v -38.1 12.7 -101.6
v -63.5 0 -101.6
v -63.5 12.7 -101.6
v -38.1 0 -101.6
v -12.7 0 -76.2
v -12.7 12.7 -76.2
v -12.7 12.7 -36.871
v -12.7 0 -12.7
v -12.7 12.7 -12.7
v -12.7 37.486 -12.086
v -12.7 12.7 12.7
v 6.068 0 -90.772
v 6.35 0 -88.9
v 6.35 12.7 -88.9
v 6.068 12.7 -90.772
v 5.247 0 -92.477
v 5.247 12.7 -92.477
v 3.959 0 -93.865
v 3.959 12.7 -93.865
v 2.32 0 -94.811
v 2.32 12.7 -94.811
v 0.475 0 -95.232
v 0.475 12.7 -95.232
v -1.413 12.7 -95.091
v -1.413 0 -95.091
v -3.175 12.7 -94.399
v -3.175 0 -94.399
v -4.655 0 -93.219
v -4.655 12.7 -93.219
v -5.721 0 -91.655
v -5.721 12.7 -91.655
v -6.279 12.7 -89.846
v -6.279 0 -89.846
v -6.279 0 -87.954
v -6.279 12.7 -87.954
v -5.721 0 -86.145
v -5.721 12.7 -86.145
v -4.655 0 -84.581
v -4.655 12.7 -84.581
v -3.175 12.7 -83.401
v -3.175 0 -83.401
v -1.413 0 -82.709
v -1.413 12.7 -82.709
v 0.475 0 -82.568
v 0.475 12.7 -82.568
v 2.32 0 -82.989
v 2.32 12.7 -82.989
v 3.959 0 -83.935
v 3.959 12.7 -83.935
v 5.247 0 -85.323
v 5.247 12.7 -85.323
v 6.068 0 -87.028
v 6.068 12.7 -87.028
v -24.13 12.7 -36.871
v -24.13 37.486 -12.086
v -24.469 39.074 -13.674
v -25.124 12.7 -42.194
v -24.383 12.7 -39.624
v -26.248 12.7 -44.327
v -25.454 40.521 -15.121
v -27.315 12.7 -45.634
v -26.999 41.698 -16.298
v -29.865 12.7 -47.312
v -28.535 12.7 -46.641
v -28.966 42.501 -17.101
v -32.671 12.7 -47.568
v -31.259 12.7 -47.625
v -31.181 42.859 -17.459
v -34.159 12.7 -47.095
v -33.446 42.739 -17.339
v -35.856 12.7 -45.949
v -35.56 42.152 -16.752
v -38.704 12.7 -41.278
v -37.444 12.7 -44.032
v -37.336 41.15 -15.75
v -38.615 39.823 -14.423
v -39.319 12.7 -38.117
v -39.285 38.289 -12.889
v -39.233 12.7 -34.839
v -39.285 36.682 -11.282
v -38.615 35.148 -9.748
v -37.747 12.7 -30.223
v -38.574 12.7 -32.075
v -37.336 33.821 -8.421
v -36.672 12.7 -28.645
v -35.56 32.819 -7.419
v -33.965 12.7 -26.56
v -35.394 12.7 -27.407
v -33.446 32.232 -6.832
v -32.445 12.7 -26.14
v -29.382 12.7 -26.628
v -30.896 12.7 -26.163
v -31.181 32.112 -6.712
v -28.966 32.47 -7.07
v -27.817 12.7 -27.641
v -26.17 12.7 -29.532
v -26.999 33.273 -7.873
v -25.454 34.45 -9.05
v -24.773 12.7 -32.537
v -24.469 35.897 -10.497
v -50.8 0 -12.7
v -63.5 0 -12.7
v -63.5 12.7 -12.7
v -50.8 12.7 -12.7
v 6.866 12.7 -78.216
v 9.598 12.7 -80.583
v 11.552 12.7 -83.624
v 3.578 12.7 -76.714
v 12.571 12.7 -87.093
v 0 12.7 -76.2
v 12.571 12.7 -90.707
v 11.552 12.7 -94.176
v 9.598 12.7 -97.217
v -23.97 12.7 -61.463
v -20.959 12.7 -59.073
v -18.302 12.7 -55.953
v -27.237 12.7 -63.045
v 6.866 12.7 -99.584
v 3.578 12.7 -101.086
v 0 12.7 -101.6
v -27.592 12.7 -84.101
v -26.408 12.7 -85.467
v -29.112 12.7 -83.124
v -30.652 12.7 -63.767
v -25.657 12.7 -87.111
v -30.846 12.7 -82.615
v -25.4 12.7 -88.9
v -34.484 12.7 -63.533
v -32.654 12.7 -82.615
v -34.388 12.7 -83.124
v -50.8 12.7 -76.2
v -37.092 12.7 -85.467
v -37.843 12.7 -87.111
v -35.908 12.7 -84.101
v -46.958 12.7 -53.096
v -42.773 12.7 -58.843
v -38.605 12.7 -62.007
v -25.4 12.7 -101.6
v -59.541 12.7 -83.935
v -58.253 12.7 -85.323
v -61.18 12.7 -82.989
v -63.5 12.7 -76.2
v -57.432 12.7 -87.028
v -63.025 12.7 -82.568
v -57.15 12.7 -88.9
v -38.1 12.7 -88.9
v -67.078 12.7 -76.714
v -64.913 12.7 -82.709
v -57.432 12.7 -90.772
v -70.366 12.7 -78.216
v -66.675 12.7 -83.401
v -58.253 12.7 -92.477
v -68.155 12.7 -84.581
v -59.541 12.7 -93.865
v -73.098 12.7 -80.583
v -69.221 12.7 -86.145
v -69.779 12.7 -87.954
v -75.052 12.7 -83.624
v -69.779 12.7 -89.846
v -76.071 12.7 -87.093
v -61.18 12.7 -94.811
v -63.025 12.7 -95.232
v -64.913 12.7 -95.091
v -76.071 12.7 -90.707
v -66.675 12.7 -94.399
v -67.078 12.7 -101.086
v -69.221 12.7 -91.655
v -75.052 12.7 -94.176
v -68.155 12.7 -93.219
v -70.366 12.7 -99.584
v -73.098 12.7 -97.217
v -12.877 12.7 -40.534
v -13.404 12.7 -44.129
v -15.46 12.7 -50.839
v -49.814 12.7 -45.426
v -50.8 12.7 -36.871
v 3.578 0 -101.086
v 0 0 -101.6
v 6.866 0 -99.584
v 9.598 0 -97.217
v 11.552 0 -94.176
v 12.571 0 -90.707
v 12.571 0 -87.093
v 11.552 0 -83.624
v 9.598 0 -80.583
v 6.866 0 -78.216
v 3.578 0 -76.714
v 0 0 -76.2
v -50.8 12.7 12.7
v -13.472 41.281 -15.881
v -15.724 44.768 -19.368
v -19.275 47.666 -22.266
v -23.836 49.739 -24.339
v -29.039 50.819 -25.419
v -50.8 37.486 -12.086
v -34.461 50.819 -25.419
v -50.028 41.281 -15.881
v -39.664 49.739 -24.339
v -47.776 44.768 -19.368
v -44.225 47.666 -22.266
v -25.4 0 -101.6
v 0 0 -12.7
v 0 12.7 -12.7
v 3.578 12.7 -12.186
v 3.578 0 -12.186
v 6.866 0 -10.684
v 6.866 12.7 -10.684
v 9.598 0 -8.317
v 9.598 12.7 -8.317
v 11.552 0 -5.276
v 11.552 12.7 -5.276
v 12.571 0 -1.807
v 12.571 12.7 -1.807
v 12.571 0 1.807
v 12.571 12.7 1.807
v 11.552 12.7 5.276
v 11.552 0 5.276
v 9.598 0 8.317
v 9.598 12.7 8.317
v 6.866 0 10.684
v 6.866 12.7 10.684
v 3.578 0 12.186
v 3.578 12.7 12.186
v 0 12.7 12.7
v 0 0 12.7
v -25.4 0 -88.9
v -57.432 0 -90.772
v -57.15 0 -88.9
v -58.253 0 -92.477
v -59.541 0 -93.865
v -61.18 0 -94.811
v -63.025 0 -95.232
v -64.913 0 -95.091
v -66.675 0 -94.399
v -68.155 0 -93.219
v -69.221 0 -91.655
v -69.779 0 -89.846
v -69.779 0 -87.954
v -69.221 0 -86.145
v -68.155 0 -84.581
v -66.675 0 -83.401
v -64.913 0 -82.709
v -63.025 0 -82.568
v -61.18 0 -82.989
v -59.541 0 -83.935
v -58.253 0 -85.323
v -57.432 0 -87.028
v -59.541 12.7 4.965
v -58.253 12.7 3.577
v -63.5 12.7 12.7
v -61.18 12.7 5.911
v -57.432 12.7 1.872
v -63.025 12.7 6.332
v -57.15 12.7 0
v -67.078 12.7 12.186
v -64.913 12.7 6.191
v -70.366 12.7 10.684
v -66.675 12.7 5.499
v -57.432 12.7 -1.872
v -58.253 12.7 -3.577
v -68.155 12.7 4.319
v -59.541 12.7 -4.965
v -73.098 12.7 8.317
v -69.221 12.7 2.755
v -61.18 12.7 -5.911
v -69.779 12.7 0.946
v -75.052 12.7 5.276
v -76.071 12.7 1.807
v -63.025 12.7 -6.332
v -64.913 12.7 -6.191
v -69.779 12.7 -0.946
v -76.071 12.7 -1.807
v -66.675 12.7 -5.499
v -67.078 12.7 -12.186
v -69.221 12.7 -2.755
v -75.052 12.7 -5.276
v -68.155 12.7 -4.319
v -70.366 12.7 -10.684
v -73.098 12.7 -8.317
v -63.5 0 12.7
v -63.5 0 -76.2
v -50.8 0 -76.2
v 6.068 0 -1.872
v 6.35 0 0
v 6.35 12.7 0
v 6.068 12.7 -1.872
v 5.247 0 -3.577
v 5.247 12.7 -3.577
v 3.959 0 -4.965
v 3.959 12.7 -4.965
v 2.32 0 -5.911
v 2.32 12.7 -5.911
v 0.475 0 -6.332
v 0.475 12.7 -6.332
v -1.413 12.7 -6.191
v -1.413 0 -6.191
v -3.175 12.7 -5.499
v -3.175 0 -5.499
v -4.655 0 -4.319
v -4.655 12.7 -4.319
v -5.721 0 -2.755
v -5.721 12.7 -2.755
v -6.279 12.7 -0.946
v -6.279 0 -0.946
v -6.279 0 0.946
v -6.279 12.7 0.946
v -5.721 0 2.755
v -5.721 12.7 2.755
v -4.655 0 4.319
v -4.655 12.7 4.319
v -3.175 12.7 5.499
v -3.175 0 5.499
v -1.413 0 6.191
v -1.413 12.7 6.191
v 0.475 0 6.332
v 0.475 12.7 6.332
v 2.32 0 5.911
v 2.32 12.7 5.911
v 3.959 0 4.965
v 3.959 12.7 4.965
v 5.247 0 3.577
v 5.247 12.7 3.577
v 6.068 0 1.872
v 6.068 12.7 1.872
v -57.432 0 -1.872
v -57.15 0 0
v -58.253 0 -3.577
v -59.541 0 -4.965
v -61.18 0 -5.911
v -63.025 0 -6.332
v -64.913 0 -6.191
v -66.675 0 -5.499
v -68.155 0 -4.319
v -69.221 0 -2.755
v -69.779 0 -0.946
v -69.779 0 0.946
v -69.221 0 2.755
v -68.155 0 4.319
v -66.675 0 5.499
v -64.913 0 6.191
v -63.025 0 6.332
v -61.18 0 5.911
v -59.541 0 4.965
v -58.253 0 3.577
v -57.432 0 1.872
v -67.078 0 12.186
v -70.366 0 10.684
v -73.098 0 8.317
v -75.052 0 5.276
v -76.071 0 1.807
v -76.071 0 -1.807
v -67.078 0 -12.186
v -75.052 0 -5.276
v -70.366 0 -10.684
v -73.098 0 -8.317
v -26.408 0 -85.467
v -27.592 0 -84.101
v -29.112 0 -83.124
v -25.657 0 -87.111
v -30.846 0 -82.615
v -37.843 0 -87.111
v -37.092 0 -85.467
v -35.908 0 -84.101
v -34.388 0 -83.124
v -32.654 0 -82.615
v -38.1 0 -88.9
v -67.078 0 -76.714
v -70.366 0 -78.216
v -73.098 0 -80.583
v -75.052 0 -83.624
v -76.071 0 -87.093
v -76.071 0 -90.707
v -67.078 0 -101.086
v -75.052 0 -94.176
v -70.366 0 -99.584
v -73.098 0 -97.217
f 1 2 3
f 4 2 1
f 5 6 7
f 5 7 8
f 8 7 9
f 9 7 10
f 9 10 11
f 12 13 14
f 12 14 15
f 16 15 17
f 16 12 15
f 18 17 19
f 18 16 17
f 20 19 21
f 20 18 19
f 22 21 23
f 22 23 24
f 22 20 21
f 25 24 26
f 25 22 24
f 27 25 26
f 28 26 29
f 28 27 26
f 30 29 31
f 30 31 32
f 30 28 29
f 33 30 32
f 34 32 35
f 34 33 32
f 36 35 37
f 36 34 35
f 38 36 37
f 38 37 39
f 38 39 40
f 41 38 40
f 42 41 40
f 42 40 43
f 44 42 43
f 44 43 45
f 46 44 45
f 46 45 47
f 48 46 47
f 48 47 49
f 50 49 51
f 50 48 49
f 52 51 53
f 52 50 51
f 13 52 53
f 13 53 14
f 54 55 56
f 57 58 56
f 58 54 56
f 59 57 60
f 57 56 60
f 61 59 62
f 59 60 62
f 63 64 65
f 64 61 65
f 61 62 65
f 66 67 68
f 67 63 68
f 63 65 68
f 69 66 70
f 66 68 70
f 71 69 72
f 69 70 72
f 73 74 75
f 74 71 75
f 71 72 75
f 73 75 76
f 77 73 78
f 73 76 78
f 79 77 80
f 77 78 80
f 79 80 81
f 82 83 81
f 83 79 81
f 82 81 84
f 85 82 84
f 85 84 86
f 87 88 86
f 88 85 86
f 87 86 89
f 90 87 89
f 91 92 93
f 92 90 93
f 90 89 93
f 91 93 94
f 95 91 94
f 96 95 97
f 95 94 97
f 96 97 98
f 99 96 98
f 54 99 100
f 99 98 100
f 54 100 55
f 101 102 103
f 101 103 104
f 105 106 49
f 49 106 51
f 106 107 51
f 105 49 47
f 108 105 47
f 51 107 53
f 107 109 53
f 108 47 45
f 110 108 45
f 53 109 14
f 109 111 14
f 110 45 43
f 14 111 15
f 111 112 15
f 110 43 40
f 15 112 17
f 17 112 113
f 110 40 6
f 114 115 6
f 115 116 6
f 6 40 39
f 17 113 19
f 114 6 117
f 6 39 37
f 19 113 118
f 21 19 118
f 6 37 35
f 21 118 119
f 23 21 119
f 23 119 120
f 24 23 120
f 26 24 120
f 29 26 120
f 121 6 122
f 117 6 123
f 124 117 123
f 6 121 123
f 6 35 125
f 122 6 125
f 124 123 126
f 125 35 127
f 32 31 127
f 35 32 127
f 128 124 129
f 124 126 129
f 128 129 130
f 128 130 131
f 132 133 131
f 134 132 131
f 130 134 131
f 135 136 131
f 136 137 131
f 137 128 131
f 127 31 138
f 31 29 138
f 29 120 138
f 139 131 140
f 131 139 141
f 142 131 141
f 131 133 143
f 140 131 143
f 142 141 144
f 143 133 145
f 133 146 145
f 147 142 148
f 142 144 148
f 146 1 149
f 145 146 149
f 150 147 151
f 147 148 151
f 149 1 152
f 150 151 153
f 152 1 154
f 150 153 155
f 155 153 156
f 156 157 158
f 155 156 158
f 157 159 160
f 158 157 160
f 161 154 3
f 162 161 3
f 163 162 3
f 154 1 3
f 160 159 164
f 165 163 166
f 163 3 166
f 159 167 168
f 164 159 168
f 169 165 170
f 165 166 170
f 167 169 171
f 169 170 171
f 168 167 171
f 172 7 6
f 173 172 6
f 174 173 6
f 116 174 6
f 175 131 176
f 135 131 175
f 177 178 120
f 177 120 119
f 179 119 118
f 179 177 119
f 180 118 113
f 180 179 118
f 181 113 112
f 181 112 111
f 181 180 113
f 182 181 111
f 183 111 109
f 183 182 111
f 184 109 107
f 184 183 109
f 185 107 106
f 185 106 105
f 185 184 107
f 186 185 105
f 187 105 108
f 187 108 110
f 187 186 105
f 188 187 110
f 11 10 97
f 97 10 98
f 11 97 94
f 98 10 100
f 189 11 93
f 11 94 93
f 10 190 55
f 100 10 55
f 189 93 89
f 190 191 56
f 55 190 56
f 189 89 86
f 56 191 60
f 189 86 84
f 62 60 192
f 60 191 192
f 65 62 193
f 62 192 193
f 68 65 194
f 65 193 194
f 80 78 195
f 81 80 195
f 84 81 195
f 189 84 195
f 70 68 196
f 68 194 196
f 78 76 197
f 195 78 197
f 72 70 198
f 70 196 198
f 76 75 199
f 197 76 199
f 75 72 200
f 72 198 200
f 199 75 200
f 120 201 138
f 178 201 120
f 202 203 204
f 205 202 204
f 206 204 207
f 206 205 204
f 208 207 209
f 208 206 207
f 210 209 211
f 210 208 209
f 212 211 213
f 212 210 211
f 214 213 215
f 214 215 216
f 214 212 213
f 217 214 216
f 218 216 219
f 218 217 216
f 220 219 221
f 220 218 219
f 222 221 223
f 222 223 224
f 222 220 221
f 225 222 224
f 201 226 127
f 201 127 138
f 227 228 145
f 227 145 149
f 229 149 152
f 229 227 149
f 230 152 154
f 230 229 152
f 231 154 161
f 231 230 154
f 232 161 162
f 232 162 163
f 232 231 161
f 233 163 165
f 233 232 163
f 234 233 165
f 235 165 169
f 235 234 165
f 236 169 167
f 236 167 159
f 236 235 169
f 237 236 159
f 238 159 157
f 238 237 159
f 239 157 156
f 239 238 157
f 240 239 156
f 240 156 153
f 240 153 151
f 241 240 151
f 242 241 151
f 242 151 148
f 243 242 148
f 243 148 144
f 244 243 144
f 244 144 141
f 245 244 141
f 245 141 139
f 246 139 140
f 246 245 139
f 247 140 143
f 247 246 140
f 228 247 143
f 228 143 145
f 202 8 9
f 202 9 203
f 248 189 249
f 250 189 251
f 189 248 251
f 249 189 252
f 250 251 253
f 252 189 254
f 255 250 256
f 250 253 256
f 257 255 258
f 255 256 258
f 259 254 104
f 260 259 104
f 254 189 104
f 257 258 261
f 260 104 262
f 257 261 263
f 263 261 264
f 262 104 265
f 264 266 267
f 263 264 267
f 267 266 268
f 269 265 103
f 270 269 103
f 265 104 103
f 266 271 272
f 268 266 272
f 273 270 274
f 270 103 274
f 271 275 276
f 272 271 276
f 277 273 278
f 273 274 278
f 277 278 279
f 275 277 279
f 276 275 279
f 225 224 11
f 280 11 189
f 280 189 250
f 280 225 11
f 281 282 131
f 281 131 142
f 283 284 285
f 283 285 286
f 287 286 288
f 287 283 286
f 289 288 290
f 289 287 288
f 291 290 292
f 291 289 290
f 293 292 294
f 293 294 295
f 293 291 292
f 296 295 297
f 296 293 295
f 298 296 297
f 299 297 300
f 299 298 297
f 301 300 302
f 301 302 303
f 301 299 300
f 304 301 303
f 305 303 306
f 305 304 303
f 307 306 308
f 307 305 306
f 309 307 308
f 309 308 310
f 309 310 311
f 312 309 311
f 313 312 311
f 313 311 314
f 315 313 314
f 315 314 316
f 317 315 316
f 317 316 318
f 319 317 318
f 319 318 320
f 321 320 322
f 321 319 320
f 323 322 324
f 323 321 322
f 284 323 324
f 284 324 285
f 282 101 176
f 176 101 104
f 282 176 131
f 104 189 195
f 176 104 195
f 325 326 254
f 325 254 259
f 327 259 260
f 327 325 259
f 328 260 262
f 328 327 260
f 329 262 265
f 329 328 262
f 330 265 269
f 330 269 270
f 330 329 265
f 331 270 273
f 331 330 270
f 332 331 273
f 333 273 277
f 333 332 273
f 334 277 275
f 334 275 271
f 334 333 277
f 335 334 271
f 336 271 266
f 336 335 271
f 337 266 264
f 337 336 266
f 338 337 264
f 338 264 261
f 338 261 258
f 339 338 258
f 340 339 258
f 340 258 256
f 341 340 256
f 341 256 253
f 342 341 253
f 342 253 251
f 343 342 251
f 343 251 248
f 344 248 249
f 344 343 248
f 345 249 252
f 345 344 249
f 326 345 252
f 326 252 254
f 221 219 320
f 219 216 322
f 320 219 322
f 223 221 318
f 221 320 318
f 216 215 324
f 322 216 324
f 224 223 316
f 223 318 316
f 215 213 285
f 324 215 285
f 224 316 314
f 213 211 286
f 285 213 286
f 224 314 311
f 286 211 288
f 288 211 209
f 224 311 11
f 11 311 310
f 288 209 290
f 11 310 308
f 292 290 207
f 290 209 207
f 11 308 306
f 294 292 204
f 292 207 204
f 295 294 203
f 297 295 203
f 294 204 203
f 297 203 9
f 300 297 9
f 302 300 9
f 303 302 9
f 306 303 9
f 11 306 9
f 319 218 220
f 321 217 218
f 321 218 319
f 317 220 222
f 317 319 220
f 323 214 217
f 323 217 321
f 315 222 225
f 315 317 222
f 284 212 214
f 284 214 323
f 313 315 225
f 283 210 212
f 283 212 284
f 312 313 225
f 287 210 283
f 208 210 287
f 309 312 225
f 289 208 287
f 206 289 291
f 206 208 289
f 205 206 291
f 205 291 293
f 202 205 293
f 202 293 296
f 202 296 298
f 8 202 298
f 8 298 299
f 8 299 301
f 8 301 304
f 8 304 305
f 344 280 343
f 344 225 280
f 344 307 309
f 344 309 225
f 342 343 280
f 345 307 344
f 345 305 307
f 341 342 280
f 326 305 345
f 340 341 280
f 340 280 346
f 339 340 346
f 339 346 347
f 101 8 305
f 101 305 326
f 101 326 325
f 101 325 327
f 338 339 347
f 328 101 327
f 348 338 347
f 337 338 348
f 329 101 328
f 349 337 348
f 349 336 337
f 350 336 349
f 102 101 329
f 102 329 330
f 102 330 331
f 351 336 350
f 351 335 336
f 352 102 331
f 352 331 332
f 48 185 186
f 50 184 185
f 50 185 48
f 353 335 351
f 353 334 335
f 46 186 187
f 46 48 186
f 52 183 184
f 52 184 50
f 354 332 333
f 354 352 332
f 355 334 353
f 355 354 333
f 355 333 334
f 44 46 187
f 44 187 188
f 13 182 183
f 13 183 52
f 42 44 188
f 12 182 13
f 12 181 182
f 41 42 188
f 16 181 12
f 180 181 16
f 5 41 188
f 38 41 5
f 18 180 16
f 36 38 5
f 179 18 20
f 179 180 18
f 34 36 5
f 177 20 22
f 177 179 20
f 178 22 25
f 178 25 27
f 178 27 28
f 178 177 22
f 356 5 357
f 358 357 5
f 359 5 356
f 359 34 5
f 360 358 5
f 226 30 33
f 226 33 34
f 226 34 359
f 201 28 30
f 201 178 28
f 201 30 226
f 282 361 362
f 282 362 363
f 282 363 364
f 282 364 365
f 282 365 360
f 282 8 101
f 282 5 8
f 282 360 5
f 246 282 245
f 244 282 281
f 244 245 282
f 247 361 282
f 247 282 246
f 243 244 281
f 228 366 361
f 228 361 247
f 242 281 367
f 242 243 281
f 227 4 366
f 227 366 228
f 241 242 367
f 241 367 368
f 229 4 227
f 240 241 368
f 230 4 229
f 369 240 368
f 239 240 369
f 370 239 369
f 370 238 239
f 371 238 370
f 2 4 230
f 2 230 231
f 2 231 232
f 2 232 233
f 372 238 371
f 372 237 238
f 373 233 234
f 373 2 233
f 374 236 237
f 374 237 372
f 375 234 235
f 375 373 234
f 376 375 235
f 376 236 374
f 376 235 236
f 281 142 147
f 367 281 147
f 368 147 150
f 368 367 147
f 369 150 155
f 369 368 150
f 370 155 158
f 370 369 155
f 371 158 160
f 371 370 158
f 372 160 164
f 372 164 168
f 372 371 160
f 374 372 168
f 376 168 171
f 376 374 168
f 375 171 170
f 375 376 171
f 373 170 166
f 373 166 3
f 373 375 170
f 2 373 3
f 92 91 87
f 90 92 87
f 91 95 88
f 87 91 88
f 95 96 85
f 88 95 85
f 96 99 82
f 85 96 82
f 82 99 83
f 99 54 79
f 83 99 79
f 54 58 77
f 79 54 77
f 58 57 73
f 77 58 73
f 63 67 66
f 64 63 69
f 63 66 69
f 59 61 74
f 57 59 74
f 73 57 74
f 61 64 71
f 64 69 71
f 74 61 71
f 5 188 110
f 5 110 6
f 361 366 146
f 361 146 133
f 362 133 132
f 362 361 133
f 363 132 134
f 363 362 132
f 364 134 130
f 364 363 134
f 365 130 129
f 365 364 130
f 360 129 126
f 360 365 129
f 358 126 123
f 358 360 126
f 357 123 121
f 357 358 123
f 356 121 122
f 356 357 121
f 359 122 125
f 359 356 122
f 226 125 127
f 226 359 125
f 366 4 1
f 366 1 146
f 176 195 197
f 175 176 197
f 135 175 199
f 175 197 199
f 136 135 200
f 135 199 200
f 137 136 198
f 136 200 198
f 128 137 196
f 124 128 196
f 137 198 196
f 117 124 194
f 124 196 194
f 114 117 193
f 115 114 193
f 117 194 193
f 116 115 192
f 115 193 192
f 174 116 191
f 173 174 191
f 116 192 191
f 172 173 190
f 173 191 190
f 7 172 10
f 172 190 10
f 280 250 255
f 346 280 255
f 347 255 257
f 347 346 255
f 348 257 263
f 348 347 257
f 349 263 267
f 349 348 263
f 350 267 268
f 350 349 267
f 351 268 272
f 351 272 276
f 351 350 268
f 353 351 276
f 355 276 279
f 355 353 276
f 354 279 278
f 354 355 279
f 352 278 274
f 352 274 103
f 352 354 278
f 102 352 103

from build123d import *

# Parameters (mm, degrees)
SKETCH2_R           = 6.35
BOSS_EXTRUDE1_DEPTH = 12.7
BOSS_EXTRUDE2_REACH = 91.803
SKETCH4_R           = 7.62


with BuildPart() as part:
    # Sketch2 → Boss-Extrude1 (new body)
    with BuildSketch(Plane(origin=(0, 0, 0), x_dir=(1, 0, 0), z_dir=(0, 1, 0))):
        with BuildLine():
            Line((-63.5, 101.6), (-38.1, 101.6))
            Line((-38.1, 101.6), (-38.1, 88.9))
            ThreePointArc((-38.1, 88.9), (-31.75, 82.55), (-25.4, 88.9))
            Line((-25.4, 88.9), (-25.4, 101.6))
            Line((-25.4, 101.6), (0, 101.6))
            ThreePointArc((0, 101.6), (12.7, 88.9), (0, 76.2))
            Line((0, 76.2), (-12.7, 76.2))
            Line((-12.7, 76.2), (-12.7, 12.7))
            Line((-12.7, 12.7), (0, 12.7))
            ThreePointArc((0, 12.7), (12.7, 0), (0, -12.7))
            Line((0, -12.7), (-63.5, -12.7))
            ThreePointArc((-63.5, -12.7), (-76.2, 0), (-63.5, 12.7))
            Line((-63.5, 12.7), (-50.8, 12.7))
            Line((-50.8, 12.7), (-50.8, 76.2))
            Line((-50.8, 76.2), (-63.5, 76.2))
            ThreePointArc((-63.5, 76.2), (-76.2, 88.9), (-63.5, 101.6))
        make_face()
        Circle(SKETCH2_R, mode=Mode.SUBTRACT)
        with Locations((0, 88.9)):
            Circle(SKETCH2_R, mode=Mode.SUBTRACT)
        with Locations((-63.5, 0)):
            Circle(SKETCH2_R, mode=Mode.SUBTRACT)
        with Locations((-63.5, 88.9)):
            Circle(SKETCH2_R, mode=Mode.SUBTRACT)
    extrude(amount=BOSS_EXTRUDE1_DEPTH)

    # Sketch4 → Boss-Extrude2 (add, up to next)
    with BuildSketch(Plane(origin=(0, 12.7, 12.7), x_dir=(1, 0, 0), z_dir=(0, 0.707106781, 0.707106781)), mode=Mode.PRIVATE) as boss_extrude2_sk1:
        with BuildLine():
            Line((-50.8, 0), (-50.8, 35.052))
            ThreePointArc((-50.8, 35.052), (-31.75, 54.102), (-12.7, 35.052))
            Line((-12.7, 35.052), (-12.7, 0))
            Line((-12.7, 0), (-50.8, 0))
        make_face()
        with Locations((-31.75, 35.052)):
            Circle(SKETCH4_R, mode=Mode.SUBTRACT)
    boss_extrude2_tool1 = extrude(boss_extrude2_sk1.sketch, amount=-BOSS_EXTRUDE2_REACH, mode=Mode.PRIVATE) - part.part
    add(boss_extrude2_tool1.solids().sort_by_distance((-31.75, 29.771946, -4.371946))[0])


solid = part.part
